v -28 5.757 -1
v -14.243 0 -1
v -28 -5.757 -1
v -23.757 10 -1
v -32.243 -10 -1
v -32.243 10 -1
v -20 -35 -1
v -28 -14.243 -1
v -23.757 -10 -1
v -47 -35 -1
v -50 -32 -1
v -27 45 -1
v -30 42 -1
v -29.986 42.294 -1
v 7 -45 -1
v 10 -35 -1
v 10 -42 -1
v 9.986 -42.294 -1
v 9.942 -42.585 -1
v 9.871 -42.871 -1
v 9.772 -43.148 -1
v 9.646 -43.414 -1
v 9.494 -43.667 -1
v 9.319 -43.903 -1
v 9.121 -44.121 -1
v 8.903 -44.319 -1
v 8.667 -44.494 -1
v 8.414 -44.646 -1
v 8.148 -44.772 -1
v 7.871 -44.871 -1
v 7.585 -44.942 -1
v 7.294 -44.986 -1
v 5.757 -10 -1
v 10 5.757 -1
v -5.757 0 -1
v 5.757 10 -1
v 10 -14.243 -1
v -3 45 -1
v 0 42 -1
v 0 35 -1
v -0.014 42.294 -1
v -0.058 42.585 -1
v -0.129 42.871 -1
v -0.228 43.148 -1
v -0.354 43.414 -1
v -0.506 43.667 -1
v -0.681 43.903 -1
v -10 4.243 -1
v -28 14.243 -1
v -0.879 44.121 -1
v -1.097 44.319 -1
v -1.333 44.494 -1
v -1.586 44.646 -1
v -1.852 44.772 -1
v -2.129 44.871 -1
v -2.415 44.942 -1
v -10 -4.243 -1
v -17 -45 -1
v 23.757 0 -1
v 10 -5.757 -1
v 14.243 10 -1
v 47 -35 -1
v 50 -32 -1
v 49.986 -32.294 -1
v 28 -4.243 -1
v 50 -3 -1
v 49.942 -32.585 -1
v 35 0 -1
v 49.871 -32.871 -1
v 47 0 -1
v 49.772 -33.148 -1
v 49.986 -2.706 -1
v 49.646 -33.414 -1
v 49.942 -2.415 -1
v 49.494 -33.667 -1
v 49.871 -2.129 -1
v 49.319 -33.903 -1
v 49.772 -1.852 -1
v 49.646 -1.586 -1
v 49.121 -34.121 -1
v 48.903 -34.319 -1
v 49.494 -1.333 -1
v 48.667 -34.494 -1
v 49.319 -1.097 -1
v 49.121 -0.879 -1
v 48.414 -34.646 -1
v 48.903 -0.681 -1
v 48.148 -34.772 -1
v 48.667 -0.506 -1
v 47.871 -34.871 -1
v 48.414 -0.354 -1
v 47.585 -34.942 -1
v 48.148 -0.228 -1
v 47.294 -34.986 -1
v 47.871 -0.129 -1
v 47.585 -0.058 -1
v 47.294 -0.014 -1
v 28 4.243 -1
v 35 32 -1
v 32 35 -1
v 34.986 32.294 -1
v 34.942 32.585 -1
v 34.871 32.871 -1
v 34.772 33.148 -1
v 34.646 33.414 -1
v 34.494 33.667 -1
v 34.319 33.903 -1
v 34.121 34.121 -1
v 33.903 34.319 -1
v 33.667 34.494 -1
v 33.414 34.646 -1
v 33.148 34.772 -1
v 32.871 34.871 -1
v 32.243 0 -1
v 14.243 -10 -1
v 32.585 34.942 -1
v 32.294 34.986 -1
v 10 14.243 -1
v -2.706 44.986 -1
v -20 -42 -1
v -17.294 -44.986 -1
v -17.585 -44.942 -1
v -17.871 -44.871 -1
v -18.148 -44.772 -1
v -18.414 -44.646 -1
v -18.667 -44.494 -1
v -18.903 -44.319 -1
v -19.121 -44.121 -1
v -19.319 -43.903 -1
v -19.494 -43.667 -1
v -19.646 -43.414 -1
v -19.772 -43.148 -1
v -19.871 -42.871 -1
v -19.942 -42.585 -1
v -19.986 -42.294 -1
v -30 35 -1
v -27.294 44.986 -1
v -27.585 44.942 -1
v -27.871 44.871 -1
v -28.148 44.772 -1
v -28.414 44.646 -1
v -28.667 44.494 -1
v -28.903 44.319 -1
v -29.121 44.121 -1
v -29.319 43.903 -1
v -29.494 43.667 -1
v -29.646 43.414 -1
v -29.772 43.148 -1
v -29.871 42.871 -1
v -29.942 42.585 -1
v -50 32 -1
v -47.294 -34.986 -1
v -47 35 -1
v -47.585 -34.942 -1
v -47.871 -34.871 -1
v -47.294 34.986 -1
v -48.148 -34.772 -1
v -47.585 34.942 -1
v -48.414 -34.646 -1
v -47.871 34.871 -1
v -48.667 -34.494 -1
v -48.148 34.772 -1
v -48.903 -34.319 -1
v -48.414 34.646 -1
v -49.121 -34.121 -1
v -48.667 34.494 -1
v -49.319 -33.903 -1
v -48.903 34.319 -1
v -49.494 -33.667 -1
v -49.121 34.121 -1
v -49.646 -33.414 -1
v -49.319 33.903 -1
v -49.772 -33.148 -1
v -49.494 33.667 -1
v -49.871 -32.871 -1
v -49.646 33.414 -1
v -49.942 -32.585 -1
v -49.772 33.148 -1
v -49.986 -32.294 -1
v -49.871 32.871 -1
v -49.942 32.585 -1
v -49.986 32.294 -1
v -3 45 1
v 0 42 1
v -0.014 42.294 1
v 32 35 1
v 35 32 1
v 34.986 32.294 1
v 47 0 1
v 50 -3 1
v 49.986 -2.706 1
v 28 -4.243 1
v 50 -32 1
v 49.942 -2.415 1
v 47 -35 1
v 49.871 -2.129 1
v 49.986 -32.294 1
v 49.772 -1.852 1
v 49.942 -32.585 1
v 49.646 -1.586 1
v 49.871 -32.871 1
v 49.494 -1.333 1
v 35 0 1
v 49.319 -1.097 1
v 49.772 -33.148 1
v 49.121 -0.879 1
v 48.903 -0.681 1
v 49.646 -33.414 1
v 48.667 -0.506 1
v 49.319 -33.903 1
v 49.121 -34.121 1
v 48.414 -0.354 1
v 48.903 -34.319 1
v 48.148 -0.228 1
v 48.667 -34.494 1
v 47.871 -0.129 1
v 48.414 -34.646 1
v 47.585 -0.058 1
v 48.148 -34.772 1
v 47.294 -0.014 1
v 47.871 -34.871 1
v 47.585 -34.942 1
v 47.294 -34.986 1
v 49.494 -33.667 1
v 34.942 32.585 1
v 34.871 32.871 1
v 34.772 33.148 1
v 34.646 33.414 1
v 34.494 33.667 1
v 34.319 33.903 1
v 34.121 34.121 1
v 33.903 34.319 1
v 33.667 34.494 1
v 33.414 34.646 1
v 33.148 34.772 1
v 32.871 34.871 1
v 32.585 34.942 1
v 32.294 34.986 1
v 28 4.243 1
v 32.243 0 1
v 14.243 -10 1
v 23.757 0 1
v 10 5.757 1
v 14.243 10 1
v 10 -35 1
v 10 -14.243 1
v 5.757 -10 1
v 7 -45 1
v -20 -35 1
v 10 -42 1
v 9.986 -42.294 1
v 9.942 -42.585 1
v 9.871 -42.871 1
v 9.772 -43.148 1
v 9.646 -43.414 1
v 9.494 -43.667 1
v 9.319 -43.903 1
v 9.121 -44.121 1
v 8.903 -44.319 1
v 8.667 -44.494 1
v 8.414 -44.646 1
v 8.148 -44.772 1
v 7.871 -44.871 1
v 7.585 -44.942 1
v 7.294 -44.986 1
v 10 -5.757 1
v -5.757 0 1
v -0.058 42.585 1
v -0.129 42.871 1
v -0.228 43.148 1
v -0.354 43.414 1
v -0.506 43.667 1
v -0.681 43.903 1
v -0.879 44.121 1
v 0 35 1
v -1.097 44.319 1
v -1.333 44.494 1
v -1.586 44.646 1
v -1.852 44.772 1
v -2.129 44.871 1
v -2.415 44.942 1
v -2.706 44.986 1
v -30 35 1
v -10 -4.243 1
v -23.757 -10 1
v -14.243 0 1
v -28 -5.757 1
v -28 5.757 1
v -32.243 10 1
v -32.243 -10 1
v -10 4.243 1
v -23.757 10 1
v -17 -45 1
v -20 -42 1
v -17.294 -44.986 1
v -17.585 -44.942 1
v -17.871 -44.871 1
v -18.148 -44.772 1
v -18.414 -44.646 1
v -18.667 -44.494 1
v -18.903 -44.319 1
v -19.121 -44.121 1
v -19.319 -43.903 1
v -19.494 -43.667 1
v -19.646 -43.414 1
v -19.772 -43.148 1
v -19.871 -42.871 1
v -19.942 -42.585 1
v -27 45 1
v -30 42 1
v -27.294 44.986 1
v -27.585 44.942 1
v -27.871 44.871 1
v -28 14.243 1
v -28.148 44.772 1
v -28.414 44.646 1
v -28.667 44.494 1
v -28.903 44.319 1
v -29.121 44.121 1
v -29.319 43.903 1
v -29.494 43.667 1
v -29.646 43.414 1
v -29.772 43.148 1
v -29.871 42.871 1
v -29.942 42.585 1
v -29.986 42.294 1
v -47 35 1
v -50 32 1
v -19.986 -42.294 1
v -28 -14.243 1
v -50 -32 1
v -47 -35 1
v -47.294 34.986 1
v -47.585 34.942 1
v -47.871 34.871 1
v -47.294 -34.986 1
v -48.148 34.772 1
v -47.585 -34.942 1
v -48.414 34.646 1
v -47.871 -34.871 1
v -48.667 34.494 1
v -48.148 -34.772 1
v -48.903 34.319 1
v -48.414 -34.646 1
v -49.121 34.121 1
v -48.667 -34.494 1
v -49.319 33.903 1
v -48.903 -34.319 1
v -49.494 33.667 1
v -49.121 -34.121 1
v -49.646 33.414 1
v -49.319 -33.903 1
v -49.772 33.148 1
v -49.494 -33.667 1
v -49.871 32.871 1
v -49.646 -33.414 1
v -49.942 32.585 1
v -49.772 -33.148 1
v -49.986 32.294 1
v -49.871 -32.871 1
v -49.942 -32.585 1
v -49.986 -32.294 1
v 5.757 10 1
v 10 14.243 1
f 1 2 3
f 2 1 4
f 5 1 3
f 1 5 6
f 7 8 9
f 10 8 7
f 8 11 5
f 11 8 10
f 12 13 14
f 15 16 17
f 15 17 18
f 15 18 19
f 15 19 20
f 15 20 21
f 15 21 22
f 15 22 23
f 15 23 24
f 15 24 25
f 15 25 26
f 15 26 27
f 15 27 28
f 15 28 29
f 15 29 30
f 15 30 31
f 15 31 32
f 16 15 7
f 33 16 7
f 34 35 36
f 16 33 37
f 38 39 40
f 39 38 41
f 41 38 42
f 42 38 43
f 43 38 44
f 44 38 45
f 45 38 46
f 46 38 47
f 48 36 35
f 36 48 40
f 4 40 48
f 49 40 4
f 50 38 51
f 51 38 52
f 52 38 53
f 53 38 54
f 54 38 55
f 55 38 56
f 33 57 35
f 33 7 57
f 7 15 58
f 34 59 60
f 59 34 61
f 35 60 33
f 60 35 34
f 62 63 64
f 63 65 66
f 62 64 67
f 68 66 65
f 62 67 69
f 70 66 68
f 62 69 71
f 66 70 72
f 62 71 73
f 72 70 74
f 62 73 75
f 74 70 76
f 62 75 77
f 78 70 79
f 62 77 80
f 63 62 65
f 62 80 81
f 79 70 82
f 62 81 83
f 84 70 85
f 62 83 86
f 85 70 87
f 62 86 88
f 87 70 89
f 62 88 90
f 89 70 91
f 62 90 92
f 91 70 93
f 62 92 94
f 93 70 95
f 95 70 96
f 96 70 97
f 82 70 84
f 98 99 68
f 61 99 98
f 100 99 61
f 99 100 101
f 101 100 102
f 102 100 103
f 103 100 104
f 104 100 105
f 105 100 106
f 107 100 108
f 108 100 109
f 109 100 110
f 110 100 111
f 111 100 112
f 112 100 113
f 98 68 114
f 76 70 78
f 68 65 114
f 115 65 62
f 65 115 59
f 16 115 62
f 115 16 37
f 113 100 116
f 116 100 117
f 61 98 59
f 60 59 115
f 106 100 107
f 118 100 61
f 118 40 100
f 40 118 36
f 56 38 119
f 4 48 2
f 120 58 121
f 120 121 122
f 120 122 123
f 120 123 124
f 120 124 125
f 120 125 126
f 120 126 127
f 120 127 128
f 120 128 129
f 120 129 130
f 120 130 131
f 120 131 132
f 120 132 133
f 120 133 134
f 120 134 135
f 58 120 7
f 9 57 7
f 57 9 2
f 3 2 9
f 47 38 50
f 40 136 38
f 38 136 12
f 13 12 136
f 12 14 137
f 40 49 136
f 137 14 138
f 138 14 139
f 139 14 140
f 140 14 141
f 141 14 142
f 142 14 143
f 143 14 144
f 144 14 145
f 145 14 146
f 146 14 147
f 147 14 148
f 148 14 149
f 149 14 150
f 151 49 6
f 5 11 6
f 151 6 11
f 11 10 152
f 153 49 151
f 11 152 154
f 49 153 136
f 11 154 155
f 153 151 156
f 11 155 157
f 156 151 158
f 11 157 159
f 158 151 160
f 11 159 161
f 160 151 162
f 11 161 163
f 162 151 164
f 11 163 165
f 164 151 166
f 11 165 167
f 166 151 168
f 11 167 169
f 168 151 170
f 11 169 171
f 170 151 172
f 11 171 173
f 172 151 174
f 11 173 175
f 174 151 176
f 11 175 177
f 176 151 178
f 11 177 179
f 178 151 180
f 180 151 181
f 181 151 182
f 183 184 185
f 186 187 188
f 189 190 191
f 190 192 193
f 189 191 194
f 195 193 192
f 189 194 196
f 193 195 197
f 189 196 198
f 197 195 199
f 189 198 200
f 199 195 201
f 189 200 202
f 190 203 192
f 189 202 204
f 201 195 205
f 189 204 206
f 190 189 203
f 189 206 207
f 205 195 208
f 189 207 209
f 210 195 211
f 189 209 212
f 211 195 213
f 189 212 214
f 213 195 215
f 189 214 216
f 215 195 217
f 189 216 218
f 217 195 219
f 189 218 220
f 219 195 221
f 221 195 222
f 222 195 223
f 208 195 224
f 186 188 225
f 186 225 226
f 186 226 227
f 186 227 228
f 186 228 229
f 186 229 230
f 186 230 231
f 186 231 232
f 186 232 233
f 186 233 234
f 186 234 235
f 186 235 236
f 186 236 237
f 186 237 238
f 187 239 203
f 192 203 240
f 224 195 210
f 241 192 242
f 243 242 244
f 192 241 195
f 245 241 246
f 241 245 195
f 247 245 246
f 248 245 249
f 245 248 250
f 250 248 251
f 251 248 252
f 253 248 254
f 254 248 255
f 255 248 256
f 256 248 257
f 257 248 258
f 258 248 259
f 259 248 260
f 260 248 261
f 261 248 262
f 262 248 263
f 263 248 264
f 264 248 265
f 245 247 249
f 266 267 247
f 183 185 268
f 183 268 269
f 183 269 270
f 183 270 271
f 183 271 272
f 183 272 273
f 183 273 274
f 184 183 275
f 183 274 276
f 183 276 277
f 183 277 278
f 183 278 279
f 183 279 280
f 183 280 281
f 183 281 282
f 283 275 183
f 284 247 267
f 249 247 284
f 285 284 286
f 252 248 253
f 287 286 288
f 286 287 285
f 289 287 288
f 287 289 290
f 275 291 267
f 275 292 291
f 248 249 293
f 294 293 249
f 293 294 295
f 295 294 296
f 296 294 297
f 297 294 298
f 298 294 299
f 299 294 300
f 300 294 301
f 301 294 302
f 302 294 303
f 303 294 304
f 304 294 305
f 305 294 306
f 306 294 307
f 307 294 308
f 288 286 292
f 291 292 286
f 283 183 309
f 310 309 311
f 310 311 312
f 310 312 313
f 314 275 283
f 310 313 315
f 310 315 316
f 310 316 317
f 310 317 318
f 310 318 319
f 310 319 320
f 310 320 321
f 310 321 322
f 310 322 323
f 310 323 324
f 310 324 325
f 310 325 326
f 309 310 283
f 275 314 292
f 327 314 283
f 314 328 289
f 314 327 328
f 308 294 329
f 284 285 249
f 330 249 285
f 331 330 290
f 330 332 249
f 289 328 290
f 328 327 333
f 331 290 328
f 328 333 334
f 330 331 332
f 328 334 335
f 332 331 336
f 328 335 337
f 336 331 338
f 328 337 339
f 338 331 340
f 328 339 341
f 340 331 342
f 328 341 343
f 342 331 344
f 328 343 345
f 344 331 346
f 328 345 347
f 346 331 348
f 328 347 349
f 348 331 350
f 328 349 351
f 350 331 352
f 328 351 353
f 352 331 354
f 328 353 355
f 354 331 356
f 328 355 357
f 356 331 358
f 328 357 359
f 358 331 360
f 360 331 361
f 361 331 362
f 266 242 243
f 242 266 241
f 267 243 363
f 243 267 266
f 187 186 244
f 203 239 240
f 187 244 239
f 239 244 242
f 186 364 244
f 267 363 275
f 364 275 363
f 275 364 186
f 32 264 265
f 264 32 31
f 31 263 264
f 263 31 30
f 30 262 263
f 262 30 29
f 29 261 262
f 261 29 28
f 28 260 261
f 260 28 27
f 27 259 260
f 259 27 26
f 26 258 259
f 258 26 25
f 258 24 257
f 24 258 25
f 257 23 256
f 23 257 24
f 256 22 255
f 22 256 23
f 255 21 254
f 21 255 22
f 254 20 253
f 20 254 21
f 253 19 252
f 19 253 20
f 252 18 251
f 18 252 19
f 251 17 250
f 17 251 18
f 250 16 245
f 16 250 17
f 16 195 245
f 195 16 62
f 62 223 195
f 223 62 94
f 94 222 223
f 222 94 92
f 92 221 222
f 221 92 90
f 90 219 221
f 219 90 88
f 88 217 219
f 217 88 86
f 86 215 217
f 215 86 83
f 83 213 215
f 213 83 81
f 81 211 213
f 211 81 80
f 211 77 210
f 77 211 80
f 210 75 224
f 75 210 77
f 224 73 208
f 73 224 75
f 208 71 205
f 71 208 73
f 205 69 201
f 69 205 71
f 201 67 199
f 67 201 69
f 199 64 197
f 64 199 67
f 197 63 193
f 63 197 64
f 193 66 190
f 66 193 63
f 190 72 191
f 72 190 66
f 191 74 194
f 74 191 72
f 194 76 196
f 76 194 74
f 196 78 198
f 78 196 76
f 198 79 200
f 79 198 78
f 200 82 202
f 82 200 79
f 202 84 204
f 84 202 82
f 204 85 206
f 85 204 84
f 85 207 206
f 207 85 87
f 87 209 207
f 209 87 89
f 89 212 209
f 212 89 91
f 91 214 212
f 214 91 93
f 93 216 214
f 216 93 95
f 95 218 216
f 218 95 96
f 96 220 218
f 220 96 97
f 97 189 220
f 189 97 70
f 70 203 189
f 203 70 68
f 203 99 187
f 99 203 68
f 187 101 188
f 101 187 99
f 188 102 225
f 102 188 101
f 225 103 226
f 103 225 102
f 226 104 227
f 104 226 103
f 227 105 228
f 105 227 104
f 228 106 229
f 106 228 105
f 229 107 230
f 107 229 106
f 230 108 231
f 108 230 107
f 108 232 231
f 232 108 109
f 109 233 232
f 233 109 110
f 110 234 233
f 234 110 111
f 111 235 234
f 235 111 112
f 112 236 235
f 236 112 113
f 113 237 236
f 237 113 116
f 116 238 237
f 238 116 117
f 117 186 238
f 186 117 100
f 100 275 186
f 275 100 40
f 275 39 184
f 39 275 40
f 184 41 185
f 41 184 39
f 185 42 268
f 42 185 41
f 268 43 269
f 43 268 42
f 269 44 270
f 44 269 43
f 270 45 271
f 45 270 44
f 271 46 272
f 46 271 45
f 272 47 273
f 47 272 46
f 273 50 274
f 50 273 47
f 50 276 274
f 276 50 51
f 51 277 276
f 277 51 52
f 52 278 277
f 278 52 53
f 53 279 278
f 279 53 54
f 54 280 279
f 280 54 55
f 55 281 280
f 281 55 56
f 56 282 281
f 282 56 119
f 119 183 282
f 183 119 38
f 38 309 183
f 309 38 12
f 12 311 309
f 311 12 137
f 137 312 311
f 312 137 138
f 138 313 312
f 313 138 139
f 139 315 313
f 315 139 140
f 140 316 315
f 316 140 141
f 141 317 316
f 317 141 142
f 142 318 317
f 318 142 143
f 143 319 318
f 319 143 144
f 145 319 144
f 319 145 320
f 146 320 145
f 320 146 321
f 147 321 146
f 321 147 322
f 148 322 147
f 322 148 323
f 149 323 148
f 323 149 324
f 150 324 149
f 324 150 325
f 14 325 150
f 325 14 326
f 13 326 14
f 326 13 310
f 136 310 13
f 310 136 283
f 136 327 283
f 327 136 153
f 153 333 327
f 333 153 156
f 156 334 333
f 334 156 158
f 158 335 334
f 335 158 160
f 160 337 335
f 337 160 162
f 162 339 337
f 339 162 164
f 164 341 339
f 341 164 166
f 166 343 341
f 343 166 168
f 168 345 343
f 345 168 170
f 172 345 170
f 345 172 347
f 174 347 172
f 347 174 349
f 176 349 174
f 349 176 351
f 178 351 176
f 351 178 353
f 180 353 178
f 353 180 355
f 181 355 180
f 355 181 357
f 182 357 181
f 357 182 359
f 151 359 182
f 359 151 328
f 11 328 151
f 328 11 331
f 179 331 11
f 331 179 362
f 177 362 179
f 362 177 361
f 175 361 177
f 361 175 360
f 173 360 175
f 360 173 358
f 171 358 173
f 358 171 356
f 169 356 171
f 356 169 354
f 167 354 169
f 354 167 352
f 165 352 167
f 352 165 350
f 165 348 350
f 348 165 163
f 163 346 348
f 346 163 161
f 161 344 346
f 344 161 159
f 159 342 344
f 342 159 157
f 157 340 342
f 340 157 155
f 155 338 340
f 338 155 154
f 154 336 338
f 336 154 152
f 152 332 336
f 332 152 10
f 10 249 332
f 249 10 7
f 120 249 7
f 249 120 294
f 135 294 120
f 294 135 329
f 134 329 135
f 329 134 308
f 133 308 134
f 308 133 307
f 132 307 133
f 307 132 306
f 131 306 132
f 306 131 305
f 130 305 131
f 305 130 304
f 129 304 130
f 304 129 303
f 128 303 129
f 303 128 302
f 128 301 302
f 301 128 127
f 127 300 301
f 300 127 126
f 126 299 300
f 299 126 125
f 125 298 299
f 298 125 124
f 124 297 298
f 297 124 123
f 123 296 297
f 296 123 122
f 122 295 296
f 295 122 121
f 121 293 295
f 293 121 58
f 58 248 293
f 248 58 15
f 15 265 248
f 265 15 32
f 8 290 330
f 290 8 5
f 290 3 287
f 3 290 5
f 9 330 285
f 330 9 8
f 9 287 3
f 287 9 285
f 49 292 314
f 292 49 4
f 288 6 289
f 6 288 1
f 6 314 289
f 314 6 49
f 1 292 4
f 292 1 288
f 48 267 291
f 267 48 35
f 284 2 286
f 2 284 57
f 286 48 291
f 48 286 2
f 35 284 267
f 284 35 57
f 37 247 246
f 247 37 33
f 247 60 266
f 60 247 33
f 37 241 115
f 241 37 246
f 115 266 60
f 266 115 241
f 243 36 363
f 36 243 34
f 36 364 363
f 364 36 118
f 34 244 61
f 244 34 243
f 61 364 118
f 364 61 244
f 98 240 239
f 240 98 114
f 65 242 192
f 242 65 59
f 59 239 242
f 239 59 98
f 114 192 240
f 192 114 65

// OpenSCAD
$fn=64;

plate_th = 2;

module diamond_hole(size=6, th=plate_th+2) {
    rotate([0,0,45]) cube([size, size, th], center=true);
}

module rounded_polygon(points, r=2) {
    union() {
        linear_extrude(height=plate_th, center=true)
            offset(r=r) offset(delta=-r)
                polygon(points=points);
    }
}

module mounting_plate() {
    pts = [
        [-50,-35],
        [-20,-35],
        [-20,-45],
        [ 10,-45],
        [ 10,-35],
        [ 50,-35],
        [ 50,  0],
        [ 35,  0],
        [ 35, 35],
        [  0, 35],
        [  0, 45],
        [-30, 45],
        [-30, 35],
        [-50, 35]
    ];

    difference() {
        rounded_polygon(pts, r=3);

        // Group A (left)
        translate([-28, -10, 0]) diamond_hole(size=6);
        translate([-28,  10, 0]) diamond_hole(size=6);
        translate([-10,   0, 0]) diamond_hole(size=6);

        // Group B (right)
        translate([ 10, -10, 0]) diamond_hole(size=6);
        translate([ 10,  10, 0]) diamond_hole(size=6);
        translate([ 28,   0, 0]) diamond_hole(size=6);
    }
}

mounting_plate();
